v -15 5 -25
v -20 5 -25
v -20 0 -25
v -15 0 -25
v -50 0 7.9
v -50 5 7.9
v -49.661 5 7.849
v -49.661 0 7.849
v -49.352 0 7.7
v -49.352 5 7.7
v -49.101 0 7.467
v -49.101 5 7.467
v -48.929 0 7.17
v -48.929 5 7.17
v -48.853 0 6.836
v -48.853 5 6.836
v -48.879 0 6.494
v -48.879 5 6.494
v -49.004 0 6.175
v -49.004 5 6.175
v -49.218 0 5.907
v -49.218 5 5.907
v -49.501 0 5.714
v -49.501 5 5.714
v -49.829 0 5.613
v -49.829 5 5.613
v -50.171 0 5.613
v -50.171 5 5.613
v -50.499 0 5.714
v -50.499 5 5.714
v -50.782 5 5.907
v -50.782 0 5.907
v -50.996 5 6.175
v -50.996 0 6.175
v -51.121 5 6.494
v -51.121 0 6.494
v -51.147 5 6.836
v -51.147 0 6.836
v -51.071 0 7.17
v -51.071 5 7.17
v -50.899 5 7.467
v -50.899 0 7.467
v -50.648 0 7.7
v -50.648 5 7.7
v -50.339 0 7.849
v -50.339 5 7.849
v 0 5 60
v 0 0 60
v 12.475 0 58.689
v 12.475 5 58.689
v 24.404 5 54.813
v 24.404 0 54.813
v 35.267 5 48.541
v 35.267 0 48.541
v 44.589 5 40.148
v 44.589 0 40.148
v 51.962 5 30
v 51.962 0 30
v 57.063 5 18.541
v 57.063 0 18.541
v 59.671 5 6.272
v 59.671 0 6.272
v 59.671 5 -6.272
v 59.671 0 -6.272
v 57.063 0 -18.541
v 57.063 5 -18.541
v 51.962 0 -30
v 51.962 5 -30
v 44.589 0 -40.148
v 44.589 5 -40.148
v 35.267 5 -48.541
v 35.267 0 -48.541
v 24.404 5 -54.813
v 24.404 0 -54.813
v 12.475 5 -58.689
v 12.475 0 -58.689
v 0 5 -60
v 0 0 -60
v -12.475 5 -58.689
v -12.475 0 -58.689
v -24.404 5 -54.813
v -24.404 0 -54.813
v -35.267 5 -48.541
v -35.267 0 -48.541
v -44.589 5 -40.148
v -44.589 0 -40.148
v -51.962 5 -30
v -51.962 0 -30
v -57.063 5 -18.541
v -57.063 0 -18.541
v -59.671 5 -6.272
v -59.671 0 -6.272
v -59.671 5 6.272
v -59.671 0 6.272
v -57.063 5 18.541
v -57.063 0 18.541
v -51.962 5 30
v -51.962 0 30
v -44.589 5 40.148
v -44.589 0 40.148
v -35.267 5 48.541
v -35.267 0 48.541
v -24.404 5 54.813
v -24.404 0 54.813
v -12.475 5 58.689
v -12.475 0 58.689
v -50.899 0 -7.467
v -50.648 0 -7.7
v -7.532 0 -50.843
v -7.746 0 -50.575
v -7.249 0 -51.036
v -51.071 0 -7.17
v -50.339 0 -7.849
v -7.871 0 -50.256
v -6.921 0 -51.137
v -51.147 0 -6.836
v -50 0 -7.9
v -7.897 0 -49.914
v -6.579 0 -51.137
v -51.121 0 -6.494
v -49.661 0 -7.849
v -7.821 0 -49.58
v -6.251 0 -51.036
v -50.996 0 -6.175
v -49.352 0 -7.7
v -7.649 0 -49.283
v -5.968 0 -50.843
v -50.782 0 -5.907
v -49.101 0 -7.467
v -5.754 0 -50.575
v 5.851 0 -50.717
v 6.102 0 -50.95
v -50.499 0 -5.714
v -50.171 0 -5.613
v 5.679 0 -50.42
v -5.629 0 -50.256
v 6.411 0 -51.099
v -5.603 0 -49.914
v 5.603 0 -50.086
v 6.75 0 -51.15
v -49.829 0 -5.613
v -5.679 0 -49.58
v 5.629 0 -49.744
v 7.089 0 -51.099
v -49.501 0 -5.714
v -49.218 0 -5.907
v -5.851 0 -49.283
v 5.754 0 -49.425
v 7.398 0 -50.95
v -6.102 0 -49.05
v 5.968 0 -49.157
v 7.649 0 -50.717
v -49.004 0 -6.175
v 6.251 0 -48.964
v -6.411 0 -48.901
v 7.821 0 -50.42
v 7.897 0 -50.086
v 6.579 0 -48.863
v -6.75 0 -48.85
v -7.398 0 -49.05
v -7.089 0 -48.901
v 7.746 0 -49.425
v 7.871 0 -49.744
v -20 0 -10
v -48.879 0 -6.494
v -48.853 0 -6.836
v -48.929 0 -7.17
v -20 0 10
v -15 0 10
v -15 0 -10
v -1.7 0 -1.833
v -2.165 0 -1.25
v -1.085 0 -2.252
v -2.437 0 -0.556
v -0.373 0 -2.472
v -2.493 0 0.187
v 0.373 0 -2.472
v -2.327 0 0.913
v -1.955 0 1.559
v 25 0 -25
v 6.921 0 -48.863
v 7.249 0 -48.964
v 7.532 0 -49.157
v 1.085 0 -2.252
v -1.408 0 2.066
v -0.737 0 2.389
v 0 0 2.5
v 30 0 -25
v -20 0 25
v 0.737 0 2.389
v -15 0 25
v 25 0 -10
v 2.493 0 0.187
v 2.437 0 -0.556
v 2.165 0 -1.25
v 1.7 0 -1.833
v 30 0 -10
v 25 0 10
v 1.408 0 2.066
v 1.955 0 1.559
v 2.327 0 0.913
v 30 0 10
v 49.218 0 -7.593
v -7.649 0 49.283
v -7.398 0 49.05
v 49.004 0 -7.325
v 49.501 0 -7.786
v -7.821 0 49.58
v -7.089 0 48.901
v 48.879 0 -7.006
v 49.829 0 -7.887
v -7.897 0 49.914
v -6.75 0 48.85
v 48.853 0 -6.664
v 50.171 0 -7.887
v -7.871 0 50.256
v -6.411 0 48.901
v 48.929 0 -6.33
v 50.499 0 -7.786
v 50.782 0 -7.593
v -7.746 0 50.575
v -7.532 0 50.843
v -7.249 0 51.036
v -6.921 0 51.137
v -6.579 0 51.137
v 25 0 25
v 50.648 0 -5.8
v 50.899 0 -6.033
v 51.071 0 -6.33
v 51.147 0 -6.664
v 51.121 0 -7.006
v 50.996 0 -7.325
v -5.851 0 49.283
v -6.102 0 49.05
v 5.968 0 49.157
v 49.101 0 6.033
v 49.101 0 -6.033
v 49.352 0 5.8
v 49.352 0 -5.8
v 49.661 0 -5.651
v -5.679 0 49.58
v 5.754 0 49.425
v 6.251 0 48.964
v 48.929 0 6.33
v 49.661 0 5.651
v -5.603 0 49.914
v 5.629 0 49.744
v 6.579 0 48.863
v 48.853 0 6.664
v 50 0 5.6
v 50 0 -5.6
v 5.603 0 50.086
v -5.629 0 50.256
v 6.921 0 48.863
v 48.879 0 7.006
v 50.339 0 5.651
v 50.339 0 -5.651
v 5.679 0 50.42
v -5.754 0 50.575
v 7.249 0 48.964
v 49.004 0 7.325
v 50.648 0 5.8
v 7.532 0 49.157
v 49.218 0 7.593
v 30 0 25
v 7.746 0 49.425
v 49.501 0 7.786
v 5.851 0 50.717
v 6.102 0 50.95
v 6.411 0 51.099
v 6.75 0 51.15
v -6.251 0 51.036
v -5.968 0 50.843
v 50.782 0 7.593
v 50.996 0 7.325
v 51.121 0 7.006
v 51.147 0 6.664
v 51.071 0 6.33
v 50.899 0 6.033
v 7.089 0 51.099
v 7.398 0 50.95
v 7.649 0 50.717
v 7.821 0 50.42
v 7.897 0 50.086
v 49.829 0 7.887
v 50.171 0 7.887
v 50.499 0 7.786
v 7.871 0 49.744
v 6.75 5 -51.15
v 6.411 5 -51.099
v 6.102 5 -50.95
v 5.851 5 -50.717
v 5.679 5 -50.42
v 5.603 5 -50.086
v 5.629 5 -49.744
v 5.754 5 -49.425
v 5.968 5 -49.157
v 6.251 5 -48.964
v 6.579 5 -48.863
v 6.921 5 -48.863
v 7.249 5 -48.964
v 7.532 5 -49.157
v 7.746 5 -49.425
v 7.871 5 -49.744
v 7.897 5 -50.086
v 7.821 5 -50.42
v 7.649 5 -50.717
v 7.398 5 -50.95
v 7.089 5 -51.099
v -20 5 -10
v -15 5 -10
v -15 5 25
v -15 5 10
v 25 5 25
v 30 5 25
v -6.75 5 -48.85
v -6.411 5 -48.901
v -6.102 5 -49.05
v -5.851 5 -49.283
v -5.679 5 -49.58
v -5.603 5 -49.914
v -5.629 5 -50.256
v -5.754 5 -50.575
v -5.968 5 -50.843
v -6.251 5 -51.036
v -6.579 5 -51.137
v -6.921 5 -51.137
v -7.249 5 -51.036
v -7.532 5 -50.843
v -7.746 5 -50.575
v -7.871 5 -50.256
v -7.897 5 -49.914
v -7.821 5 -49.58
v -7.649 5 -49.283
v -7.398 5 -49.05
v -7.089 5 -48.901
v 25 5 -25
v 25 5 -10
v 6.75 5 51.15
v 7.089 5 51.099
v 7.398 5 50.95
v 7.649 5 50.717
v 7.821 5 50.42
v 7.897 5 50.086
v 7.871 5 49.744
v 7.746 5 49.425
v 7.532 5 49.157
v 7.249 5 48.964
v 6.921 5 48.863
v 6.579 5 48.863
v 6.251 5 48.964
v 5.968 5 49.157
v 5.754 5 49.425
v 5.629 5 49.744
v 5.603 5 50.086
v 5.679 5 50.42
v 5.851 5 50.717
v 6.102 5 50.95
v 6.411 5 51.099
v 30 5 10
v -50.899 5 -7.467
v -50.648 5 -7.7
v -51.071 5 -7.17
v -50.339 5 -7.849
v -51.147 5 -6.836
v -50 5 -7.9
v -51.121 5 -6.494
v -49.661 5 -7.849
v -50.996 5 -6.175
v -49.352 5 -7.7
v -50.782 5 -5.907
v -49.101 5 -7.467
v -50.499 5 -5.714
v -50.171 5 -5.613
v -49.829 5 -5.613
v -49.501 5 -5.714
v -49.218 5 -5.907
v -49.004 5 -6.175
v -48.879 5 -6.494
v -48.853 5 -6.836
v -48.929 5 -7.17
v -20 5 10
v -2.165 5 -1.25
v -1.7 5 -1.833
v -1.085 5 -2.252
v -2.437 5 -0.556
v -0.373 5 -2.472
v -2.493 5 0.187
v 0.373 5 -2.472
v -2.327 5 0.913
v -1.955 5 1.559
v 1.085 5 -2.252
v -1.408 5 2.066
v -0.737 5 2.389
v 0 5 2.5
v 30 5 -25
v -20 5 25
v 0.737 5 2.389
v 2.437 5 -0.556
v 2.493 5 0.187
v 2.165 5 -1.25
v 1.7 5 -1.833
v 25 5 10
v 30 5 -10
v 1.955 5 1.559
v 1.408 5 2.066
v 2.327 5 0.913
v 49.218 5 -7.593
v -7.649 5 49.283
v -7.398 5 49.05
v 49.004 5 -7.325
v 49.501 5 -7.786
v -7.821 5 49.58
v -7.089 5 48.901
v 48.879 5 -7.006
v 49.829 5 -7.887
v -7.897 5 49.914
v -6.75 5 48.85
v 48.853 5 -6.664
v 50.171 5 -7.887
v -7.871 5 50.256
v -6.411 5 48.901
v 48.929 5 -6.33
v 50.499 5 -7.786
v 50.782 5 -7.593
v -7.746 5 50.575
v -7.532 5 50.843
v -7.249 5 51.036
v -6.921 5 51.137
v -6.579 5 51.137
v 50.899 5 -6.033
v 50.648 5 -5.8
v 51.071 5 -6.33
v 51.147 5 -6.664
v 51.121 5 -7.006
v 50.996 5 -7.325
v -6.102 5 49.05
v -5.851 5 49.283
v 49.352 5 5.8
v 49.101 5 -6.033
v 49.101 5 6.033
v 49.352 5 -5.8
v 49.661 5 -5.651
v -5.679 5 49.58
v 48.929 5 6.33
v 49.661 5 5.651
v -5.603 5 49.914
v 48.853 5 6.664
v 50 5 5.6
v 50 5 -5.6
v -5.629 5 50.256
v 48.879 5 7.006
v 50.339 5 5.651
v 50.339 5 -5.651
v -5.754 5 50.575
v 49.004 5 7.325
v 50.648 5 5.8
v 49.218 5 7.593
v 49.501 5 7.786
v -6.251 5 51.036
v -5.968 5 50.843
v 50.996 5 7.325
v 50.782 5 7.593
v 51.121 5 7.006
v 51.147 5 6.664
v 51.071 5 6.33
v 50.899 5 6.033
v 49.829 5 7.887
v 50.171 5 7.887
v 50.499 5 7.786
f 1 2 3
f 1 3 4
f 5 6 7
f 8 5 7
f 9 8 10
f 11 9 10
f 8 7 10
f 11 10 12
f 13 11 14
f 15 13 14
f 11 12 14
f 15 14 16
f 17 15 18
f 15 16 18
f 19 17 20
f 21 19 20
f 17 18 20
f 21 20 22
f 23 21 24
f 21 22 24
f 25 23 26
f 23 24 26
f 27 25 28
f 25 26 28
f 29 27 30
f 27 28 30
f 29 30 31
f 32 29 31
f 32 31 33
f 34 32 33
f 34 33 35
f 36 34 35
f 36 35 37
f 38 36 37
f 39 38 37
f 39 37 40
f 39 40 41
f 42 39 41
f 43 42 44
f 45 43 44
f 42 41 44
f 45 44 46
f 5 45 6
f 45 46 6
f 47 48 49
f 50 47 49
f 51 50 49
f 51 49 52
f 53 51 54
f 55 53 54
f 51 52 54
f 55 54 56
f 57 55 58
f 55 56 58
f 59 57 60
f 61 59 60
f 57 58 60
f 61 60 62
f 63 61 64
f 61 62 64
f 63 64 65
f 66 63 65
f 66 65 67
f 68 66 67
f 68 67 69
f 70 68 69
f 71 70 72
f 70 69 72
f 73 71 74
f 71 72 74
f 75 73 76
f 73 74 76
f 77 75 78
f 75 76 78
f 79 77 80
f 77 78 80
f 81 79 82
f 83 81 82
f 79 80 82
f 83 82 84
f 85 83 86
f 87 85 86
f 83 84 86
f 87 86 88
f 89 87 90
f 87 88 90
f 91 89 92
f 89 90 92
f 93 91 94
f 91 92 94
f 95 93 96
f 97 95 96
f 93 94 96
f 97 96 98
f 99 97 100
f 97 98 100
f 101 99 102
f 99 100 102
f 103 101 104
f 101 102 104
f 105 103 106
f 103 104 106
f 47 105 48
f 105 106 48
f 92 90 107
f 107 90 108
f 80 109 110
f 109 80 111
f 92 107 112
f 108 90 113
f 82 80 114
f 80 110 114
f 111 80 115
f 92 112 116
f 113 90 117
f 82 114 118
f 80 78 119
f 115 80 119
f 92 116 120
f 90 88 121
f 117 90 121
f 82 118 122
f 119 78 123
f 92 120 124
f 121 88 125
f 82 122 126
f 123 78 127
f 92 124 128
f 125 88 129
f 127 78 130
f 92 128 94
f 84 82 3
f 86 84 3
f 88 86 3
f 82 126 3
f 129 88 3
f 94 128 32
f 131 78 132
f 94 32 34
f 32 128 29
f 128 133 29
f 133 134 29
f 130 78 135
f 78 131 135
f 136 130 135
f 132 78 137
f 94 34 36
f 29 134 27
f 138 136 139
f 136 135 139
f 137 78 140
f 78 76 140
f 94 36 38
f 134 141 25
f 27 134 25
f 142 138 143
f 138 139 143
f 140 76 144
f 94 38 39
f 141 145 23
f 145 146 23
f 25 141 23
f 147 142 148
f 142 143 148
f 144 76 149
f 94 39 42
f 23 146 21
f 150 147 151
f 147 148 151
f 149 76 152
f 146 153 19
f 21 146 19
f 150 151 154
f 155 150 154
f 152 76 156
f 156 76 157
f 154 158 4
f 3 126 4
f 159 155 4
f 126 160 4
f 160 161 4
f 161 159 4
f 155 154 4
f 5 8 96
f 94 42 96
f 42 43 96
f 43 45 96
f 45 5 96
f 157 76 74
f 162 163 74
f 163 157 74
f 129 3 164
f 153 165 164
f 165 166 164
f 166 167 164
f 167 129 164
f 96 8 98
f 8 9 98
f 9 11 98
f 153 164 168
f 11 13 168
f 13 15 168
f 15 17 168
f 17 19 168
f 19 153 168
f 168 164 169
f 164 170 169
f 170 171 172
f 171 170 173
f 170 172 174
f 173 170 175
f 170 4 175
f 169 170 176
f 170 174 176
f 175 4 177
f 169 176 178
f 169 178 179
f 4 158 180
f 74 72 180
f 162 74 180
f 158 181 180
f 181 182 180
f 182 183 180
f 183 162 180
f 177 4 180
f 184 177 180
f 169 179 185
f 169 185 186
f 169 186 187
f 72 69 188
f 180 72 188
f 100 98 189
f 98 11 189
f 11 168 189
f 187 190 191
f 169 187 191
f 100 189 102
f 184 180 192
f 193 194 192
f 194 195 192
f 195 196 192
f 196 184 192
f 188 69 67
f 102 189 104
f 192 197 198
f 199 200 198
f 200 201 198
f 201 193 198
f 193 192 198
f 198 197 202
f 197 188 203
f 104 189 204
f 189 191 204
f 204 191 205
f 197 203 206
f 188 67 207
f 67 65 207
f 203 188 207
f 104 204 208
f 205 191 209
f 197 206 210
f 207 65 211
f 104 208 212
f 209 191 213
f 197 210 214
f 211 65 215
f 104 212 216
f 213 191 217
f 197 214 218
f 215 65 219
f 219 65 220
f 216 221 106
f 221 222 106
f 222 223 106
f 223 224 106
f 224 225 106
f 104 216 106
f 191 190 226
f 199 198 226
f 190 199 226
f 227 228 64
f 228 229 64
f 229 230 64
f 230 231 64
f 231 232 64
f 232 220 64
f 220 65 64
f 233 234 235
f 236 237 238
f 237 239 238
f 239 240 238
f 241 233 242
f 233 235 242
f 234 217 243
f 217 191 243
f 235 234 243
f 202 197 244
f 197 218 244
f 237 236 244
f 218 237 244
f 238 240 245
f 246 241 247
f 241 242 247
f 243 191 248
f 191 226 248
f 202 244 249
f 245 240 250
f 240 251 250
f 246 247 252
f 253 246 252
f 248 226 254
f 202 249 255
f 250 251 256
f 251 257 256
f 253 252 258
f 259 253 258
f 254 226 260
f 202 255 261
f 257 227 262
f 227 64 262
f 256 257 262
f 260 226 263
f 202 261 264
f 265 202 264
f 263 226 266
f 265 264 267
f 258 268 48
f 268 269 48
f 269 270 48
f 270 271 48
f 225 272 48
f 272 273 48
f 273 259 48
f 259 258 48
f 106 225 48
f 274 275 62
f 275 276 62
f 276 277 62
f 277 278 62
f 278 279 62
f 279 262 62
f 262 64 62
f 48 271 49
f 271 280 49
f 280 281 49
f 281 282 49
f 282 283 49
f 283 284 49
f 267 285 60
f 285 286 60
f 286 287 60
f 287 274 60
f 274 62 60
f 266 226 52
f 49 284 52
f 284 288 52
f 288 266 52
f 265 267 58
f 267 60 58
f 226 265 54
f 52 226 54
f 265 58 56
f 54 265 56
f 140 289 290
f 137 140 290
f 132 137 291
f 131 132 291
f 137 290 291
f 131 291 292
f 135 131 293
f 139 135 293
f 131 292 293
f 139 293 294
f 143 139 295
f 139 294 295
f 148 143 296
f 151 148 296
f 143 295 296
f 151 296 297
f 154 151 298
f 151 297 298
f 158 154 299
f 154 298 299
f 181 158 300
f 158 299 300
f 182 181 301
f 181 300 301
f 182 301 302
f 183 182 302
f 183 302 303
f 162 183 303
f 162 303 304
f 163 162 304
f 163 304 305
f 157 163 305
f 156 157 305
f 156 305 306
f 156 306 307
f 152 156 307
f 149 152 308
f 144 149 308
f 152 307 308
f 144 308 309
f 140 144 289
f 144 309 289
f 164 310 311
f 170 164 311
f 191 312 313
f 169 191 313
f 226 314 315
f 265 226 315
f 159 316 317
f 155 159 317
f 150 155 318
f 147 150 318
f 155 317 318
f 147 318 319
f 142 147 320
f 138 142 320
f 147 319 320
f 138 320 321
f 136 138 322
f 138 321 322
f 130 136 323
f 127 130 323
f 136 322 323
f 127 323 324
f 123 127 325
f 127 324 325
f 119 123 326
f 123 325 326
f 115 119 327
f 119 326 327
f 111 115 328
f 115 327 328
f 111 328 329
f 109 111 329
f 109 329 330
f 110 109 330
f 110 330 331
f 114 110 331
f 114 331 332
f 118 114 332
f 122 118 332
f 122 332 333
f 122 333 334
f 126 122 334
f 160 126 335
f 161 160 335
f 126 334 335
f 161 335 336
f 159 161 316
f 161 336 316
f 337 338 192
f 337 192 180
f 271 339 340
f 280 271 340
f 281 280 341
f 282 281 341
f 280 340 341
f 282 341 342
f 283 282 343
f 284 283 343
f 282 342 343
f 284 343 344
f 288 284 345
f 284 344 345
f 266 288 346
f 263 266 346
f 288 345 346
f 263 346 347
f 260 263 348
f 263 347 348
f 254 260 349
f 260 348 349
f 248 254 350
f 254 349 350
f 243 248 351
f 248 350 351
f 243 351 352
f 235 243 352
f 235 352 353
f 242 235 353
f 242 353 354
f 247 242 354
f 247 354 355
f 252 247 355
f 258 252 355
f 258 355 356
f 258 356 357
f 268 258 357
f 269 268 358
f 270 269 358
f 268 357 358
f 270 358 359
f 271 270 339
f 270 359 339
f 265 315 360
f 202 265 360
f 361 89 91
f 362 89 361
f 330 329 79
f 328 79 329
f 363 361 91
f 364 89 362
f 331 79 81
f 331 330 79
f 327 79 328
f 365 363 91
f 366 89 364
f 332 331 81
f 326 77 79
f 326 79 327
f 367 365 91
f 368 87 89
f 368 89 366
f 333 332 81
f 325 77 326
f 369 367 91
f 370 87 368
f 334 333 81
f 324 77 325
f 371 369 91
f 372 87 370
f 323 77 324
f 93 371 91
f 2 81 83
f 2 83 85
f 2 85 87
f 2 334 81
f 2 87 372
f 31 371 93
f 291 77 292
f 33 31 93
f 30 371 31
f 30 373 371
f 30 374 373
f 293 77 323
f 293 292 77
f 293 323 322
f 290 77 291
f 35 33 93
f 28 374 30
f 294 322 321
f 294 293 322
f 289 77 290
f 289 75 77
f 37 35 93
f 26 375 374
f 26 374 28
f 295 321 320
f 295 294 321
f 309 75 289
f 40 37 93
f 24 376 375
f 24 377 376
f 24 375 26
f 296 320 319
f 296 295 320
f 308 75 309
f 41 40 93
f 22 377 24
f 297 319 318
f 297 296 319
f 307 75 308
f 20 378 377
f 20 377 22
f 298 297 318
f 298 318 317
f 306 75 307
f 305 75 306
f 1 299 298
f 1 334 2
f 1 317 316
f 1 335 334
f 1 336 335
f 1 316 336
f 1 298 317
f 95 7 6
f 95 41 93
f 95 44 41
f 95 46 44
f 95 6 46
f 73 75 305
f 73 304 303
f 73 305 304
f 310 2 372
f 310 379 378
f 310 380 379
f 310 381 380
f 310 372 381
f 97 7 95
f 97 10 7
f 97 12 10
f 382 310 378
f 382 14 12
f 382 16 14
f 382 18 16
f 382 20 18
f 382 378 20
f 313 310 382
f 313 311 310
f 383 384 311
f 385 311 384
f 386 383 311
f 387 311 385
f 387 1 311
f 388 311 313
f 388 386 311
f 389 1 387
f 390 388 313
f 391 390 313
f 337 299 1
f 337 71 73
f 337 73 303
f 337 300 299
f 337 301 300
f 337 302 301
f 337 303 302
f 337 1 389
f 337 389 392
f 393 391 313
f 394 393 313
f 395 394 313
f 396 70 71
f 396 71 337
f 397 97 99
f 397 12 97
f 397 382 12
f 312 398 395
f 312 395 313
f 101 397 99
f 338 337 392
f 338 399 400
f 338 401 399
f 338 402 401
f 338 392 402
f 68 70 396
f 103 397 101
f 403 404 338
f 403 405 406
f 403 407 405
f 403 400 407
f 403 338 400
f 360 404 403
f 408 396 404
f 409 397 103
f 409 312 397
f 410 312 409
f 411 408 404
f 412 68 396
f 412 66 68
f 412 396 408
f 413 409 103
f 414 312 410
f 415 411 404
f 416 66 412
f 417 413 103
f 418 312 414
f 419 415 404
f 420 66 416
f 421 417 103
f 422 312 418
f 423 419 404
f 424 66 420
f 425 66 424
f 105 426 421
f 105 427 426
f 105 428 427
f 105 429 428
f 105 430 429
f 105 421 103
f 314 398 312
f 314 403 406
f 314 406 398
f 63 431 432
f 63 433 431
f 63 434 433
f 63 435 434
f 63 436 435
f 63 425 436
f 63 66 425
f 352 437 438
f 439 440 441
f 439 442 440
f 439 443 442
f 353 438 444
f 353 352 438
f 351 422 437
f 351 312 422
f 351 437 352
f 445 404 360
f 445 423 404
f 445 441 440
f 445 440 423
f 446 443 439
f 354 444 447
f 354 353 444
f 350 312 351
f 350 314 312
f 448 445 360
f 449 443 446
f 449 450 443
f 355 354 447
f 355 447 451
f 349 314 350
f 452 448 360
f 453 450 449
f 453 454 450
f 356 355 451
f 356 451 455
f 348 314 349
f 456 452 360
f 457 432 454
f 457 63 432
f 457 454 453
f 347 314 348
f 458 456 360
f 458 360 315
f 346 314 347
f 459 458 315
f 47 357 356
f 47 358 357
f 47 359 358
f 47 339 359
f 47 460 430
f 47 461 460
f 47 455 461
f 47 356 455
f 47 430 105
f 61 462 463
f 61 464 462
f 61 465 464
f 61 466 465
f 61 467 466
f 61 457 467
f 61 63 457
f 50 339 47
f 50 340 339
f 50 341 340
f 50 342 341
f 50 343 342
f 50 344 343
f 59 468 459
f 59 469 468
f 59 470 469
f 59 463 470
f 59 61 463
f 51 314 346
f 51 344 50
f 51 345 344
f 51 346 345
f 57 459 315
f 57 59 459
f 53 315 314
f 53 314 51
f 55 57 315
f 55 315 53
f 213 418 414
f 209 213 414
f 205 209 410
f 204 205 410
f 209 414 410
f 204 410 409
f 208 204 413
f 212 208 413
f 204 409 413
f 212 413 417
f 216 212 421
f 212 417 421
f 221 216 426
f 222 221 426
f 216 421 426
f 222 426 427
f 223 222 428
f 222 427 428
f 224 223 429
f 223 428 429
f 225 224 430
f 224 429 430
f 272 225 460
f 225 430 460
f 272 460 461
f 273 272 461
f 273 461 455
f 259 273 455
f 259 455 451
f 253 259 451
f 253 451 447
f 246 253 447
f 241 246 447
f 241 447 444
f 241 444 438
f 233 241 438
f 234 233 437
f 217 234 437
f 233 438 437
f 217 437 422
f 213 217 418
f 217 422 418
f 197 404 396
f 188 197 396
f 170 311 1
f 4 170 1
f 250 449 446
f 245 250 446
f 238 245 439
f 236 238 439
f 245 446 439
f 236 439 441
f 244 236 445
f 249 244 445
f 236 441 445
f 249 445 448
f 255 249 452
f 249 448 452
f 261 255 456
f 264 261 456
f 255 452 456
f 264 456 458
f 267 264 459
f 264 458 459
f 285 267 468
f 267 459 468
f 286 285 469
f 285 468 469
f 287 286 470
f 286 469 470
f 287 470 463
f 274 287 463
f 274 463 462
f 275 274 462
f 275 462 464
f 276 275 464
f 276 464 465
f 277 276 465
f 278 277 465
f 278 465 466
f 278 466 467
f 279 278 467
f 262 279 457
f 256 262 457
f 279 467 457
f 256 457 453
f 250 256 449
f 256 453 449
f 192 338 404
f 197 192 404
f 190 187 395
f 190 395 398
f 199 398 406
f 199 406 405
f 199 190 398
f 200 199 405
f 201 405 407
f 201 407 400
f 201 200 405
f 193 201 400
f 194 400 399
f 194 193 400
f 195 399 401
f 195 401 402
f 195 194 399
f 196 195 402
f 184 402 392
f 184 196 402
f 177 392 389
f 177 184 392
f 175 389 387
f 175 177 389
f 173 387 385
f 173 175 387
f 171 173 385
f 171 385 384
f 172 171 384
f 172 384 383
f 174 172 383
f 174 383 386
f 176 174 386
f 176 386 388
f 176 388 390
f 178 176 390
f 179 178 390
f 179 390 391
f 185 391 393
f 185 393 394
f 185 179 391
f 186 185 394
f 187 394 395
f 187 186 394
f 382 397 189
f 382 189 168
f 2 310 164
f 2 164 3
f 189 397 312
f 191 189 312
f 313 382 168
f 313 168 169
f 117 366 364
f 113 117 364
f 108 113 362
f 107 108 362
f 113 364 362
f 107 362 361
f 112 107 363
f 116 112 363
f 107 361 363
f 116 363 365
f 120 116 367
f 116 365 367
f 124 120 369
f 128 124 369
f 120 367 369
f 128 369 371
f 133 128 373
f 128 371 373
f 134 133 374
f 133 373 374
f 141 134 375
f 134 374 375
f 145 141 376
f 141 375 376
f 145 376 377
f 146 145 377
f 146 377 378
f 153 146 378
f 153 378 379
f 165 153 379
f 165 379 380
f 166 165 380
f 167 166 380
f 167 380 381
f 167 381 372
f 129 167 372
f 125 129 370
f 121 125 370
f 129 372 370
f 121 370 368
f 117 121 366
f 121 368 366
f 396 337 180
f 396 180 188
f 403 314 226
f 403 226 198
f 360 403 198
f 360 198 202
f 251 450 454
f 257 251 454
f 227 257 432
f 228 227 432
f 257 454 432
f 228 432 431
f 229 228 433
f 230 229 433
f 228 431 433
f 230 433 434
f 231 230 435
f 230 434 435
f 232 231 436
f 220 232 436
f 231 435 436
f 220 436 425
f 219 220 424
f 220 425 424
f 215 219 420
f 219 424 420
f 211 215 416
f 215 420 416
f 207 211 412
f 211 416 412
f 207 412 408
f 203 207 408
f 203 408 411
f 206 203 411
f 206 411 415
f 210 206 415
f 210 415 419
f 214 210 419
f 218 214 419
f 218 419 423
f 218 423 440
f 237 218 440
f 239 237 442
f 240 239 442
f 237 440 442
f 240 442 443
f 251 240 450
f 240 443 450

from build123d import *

# Parameters (mm, degrees)
SKETCH1_R           = 60
SKETCH1_R_2         = 2.5
BOSS_EXTRUDE1_DEPTH = 5
SKETCH4_R           = 1.15
CUT_EXTRUDE1_DEPTH  = 5
SKETCH5_W           = 5
SKETCH5_H           = 15
CUT_EXTRUDE2_DEPTH  = 5
SKETCH6_W           = 5
SKETCH6_H           = 15
CUT_EXTRUDE3_DEPTH  = 5


with BuildPart() as part:
    # Sketch1 → Boss-Extrude1 (new body)
    with BuildSketch(Plane(origin=(0, 0, 0), x_dir=(1, 0, 0), z_dir=(0, 1, 0))):
        with Locations(Location((0, 0, 0), (0, 0, 270))):
            Circle(SKETCH1_R)
        with Locations(Location((0, 0, 0), (0, 0, 270))):
            Circle(SKETCH1_R_2, mode=Mode.SUBTRACT)
    extrude(amount=BOSS_EXTRUDE1_DEPTH)

    # Sketch4 → Cut-Extrude1 (cut)
    with BuildSketch(Plane(origin=(0, 5, 0), x_dir=(1, 0, 0), z_dir=(0, 1, 0))):
        with Locations(Location((-6.75, 50, 0), (0, 0, 270))):
            Circle(SKETCH4_R)
        with Locations(Location((50, 6.75, 0), (0, 0, 270))):
            Circle(SKETCH4_R)
        with Locations(Location((6.75, -50, 0), (0, 0, 270))):
            Circle(SKETCH4_R)
        with Locations(Location((-50, -6.75, 0), (0, 0, 270))):
            Circle(SKETCH4_R)
        with Locations(Location((6.75, 50, 0), (0, 0, 90))):
            Circle(SKETCH4_R)
        with Locations(Location((50, -6.75, 0), (0, 0, 90))):
            Circle(SKETCH4_R)
        with Locations(Location((-6.75, -50, 0), (0, 0, 90))):
            Circle(SKETCH4_R)
        with Locations(Location((-50, 6.75, 0), (0, 0, 90))):
            Circle(SKETCH4_R)
    extrude(amount=-CUT_EXTRUDE1_DEPTH, mode=Mode.SUBTRACT)

    # Sketch5 → Cut-Extrude2 (cut)
    with BuildSketch(Plane(origin=(0, 5, 0), x_dir=(1, 0, 0), z_dir=(0, 1, 0))):
        with Locations((-17.5, 17.5)):
            Rectangle(SKETCH5_W, SKETCH5_H)
        with Locations((-17.5, -17.5)):
            Rectangle(SKETCH5_W, SKETCH5_H)
    extrude(amount=-CUT_EXTRUDE2_DEPTH, mode=Mode.SUBTRACT)

    # Sketch6 → Cut-Extrude3 (cut)
    with BuildSketch(Plane(origin=(0, 5, 0), x_dir=(1, 0, 0), z_dir=(0, 1, 0))):
        with Locations((27.5, 17.5)):
            Rectangle(SKETCH6_W, SKETCH6_H)
        with Locations((27.5, -17.5)):
            Rectangle(SKETCH6_W, SKETCH6_H)
    extrude(amount=-CUT_EXTRUDE3_DEPTH, mode=Mode.SUBTRACT)


solid = part.part
